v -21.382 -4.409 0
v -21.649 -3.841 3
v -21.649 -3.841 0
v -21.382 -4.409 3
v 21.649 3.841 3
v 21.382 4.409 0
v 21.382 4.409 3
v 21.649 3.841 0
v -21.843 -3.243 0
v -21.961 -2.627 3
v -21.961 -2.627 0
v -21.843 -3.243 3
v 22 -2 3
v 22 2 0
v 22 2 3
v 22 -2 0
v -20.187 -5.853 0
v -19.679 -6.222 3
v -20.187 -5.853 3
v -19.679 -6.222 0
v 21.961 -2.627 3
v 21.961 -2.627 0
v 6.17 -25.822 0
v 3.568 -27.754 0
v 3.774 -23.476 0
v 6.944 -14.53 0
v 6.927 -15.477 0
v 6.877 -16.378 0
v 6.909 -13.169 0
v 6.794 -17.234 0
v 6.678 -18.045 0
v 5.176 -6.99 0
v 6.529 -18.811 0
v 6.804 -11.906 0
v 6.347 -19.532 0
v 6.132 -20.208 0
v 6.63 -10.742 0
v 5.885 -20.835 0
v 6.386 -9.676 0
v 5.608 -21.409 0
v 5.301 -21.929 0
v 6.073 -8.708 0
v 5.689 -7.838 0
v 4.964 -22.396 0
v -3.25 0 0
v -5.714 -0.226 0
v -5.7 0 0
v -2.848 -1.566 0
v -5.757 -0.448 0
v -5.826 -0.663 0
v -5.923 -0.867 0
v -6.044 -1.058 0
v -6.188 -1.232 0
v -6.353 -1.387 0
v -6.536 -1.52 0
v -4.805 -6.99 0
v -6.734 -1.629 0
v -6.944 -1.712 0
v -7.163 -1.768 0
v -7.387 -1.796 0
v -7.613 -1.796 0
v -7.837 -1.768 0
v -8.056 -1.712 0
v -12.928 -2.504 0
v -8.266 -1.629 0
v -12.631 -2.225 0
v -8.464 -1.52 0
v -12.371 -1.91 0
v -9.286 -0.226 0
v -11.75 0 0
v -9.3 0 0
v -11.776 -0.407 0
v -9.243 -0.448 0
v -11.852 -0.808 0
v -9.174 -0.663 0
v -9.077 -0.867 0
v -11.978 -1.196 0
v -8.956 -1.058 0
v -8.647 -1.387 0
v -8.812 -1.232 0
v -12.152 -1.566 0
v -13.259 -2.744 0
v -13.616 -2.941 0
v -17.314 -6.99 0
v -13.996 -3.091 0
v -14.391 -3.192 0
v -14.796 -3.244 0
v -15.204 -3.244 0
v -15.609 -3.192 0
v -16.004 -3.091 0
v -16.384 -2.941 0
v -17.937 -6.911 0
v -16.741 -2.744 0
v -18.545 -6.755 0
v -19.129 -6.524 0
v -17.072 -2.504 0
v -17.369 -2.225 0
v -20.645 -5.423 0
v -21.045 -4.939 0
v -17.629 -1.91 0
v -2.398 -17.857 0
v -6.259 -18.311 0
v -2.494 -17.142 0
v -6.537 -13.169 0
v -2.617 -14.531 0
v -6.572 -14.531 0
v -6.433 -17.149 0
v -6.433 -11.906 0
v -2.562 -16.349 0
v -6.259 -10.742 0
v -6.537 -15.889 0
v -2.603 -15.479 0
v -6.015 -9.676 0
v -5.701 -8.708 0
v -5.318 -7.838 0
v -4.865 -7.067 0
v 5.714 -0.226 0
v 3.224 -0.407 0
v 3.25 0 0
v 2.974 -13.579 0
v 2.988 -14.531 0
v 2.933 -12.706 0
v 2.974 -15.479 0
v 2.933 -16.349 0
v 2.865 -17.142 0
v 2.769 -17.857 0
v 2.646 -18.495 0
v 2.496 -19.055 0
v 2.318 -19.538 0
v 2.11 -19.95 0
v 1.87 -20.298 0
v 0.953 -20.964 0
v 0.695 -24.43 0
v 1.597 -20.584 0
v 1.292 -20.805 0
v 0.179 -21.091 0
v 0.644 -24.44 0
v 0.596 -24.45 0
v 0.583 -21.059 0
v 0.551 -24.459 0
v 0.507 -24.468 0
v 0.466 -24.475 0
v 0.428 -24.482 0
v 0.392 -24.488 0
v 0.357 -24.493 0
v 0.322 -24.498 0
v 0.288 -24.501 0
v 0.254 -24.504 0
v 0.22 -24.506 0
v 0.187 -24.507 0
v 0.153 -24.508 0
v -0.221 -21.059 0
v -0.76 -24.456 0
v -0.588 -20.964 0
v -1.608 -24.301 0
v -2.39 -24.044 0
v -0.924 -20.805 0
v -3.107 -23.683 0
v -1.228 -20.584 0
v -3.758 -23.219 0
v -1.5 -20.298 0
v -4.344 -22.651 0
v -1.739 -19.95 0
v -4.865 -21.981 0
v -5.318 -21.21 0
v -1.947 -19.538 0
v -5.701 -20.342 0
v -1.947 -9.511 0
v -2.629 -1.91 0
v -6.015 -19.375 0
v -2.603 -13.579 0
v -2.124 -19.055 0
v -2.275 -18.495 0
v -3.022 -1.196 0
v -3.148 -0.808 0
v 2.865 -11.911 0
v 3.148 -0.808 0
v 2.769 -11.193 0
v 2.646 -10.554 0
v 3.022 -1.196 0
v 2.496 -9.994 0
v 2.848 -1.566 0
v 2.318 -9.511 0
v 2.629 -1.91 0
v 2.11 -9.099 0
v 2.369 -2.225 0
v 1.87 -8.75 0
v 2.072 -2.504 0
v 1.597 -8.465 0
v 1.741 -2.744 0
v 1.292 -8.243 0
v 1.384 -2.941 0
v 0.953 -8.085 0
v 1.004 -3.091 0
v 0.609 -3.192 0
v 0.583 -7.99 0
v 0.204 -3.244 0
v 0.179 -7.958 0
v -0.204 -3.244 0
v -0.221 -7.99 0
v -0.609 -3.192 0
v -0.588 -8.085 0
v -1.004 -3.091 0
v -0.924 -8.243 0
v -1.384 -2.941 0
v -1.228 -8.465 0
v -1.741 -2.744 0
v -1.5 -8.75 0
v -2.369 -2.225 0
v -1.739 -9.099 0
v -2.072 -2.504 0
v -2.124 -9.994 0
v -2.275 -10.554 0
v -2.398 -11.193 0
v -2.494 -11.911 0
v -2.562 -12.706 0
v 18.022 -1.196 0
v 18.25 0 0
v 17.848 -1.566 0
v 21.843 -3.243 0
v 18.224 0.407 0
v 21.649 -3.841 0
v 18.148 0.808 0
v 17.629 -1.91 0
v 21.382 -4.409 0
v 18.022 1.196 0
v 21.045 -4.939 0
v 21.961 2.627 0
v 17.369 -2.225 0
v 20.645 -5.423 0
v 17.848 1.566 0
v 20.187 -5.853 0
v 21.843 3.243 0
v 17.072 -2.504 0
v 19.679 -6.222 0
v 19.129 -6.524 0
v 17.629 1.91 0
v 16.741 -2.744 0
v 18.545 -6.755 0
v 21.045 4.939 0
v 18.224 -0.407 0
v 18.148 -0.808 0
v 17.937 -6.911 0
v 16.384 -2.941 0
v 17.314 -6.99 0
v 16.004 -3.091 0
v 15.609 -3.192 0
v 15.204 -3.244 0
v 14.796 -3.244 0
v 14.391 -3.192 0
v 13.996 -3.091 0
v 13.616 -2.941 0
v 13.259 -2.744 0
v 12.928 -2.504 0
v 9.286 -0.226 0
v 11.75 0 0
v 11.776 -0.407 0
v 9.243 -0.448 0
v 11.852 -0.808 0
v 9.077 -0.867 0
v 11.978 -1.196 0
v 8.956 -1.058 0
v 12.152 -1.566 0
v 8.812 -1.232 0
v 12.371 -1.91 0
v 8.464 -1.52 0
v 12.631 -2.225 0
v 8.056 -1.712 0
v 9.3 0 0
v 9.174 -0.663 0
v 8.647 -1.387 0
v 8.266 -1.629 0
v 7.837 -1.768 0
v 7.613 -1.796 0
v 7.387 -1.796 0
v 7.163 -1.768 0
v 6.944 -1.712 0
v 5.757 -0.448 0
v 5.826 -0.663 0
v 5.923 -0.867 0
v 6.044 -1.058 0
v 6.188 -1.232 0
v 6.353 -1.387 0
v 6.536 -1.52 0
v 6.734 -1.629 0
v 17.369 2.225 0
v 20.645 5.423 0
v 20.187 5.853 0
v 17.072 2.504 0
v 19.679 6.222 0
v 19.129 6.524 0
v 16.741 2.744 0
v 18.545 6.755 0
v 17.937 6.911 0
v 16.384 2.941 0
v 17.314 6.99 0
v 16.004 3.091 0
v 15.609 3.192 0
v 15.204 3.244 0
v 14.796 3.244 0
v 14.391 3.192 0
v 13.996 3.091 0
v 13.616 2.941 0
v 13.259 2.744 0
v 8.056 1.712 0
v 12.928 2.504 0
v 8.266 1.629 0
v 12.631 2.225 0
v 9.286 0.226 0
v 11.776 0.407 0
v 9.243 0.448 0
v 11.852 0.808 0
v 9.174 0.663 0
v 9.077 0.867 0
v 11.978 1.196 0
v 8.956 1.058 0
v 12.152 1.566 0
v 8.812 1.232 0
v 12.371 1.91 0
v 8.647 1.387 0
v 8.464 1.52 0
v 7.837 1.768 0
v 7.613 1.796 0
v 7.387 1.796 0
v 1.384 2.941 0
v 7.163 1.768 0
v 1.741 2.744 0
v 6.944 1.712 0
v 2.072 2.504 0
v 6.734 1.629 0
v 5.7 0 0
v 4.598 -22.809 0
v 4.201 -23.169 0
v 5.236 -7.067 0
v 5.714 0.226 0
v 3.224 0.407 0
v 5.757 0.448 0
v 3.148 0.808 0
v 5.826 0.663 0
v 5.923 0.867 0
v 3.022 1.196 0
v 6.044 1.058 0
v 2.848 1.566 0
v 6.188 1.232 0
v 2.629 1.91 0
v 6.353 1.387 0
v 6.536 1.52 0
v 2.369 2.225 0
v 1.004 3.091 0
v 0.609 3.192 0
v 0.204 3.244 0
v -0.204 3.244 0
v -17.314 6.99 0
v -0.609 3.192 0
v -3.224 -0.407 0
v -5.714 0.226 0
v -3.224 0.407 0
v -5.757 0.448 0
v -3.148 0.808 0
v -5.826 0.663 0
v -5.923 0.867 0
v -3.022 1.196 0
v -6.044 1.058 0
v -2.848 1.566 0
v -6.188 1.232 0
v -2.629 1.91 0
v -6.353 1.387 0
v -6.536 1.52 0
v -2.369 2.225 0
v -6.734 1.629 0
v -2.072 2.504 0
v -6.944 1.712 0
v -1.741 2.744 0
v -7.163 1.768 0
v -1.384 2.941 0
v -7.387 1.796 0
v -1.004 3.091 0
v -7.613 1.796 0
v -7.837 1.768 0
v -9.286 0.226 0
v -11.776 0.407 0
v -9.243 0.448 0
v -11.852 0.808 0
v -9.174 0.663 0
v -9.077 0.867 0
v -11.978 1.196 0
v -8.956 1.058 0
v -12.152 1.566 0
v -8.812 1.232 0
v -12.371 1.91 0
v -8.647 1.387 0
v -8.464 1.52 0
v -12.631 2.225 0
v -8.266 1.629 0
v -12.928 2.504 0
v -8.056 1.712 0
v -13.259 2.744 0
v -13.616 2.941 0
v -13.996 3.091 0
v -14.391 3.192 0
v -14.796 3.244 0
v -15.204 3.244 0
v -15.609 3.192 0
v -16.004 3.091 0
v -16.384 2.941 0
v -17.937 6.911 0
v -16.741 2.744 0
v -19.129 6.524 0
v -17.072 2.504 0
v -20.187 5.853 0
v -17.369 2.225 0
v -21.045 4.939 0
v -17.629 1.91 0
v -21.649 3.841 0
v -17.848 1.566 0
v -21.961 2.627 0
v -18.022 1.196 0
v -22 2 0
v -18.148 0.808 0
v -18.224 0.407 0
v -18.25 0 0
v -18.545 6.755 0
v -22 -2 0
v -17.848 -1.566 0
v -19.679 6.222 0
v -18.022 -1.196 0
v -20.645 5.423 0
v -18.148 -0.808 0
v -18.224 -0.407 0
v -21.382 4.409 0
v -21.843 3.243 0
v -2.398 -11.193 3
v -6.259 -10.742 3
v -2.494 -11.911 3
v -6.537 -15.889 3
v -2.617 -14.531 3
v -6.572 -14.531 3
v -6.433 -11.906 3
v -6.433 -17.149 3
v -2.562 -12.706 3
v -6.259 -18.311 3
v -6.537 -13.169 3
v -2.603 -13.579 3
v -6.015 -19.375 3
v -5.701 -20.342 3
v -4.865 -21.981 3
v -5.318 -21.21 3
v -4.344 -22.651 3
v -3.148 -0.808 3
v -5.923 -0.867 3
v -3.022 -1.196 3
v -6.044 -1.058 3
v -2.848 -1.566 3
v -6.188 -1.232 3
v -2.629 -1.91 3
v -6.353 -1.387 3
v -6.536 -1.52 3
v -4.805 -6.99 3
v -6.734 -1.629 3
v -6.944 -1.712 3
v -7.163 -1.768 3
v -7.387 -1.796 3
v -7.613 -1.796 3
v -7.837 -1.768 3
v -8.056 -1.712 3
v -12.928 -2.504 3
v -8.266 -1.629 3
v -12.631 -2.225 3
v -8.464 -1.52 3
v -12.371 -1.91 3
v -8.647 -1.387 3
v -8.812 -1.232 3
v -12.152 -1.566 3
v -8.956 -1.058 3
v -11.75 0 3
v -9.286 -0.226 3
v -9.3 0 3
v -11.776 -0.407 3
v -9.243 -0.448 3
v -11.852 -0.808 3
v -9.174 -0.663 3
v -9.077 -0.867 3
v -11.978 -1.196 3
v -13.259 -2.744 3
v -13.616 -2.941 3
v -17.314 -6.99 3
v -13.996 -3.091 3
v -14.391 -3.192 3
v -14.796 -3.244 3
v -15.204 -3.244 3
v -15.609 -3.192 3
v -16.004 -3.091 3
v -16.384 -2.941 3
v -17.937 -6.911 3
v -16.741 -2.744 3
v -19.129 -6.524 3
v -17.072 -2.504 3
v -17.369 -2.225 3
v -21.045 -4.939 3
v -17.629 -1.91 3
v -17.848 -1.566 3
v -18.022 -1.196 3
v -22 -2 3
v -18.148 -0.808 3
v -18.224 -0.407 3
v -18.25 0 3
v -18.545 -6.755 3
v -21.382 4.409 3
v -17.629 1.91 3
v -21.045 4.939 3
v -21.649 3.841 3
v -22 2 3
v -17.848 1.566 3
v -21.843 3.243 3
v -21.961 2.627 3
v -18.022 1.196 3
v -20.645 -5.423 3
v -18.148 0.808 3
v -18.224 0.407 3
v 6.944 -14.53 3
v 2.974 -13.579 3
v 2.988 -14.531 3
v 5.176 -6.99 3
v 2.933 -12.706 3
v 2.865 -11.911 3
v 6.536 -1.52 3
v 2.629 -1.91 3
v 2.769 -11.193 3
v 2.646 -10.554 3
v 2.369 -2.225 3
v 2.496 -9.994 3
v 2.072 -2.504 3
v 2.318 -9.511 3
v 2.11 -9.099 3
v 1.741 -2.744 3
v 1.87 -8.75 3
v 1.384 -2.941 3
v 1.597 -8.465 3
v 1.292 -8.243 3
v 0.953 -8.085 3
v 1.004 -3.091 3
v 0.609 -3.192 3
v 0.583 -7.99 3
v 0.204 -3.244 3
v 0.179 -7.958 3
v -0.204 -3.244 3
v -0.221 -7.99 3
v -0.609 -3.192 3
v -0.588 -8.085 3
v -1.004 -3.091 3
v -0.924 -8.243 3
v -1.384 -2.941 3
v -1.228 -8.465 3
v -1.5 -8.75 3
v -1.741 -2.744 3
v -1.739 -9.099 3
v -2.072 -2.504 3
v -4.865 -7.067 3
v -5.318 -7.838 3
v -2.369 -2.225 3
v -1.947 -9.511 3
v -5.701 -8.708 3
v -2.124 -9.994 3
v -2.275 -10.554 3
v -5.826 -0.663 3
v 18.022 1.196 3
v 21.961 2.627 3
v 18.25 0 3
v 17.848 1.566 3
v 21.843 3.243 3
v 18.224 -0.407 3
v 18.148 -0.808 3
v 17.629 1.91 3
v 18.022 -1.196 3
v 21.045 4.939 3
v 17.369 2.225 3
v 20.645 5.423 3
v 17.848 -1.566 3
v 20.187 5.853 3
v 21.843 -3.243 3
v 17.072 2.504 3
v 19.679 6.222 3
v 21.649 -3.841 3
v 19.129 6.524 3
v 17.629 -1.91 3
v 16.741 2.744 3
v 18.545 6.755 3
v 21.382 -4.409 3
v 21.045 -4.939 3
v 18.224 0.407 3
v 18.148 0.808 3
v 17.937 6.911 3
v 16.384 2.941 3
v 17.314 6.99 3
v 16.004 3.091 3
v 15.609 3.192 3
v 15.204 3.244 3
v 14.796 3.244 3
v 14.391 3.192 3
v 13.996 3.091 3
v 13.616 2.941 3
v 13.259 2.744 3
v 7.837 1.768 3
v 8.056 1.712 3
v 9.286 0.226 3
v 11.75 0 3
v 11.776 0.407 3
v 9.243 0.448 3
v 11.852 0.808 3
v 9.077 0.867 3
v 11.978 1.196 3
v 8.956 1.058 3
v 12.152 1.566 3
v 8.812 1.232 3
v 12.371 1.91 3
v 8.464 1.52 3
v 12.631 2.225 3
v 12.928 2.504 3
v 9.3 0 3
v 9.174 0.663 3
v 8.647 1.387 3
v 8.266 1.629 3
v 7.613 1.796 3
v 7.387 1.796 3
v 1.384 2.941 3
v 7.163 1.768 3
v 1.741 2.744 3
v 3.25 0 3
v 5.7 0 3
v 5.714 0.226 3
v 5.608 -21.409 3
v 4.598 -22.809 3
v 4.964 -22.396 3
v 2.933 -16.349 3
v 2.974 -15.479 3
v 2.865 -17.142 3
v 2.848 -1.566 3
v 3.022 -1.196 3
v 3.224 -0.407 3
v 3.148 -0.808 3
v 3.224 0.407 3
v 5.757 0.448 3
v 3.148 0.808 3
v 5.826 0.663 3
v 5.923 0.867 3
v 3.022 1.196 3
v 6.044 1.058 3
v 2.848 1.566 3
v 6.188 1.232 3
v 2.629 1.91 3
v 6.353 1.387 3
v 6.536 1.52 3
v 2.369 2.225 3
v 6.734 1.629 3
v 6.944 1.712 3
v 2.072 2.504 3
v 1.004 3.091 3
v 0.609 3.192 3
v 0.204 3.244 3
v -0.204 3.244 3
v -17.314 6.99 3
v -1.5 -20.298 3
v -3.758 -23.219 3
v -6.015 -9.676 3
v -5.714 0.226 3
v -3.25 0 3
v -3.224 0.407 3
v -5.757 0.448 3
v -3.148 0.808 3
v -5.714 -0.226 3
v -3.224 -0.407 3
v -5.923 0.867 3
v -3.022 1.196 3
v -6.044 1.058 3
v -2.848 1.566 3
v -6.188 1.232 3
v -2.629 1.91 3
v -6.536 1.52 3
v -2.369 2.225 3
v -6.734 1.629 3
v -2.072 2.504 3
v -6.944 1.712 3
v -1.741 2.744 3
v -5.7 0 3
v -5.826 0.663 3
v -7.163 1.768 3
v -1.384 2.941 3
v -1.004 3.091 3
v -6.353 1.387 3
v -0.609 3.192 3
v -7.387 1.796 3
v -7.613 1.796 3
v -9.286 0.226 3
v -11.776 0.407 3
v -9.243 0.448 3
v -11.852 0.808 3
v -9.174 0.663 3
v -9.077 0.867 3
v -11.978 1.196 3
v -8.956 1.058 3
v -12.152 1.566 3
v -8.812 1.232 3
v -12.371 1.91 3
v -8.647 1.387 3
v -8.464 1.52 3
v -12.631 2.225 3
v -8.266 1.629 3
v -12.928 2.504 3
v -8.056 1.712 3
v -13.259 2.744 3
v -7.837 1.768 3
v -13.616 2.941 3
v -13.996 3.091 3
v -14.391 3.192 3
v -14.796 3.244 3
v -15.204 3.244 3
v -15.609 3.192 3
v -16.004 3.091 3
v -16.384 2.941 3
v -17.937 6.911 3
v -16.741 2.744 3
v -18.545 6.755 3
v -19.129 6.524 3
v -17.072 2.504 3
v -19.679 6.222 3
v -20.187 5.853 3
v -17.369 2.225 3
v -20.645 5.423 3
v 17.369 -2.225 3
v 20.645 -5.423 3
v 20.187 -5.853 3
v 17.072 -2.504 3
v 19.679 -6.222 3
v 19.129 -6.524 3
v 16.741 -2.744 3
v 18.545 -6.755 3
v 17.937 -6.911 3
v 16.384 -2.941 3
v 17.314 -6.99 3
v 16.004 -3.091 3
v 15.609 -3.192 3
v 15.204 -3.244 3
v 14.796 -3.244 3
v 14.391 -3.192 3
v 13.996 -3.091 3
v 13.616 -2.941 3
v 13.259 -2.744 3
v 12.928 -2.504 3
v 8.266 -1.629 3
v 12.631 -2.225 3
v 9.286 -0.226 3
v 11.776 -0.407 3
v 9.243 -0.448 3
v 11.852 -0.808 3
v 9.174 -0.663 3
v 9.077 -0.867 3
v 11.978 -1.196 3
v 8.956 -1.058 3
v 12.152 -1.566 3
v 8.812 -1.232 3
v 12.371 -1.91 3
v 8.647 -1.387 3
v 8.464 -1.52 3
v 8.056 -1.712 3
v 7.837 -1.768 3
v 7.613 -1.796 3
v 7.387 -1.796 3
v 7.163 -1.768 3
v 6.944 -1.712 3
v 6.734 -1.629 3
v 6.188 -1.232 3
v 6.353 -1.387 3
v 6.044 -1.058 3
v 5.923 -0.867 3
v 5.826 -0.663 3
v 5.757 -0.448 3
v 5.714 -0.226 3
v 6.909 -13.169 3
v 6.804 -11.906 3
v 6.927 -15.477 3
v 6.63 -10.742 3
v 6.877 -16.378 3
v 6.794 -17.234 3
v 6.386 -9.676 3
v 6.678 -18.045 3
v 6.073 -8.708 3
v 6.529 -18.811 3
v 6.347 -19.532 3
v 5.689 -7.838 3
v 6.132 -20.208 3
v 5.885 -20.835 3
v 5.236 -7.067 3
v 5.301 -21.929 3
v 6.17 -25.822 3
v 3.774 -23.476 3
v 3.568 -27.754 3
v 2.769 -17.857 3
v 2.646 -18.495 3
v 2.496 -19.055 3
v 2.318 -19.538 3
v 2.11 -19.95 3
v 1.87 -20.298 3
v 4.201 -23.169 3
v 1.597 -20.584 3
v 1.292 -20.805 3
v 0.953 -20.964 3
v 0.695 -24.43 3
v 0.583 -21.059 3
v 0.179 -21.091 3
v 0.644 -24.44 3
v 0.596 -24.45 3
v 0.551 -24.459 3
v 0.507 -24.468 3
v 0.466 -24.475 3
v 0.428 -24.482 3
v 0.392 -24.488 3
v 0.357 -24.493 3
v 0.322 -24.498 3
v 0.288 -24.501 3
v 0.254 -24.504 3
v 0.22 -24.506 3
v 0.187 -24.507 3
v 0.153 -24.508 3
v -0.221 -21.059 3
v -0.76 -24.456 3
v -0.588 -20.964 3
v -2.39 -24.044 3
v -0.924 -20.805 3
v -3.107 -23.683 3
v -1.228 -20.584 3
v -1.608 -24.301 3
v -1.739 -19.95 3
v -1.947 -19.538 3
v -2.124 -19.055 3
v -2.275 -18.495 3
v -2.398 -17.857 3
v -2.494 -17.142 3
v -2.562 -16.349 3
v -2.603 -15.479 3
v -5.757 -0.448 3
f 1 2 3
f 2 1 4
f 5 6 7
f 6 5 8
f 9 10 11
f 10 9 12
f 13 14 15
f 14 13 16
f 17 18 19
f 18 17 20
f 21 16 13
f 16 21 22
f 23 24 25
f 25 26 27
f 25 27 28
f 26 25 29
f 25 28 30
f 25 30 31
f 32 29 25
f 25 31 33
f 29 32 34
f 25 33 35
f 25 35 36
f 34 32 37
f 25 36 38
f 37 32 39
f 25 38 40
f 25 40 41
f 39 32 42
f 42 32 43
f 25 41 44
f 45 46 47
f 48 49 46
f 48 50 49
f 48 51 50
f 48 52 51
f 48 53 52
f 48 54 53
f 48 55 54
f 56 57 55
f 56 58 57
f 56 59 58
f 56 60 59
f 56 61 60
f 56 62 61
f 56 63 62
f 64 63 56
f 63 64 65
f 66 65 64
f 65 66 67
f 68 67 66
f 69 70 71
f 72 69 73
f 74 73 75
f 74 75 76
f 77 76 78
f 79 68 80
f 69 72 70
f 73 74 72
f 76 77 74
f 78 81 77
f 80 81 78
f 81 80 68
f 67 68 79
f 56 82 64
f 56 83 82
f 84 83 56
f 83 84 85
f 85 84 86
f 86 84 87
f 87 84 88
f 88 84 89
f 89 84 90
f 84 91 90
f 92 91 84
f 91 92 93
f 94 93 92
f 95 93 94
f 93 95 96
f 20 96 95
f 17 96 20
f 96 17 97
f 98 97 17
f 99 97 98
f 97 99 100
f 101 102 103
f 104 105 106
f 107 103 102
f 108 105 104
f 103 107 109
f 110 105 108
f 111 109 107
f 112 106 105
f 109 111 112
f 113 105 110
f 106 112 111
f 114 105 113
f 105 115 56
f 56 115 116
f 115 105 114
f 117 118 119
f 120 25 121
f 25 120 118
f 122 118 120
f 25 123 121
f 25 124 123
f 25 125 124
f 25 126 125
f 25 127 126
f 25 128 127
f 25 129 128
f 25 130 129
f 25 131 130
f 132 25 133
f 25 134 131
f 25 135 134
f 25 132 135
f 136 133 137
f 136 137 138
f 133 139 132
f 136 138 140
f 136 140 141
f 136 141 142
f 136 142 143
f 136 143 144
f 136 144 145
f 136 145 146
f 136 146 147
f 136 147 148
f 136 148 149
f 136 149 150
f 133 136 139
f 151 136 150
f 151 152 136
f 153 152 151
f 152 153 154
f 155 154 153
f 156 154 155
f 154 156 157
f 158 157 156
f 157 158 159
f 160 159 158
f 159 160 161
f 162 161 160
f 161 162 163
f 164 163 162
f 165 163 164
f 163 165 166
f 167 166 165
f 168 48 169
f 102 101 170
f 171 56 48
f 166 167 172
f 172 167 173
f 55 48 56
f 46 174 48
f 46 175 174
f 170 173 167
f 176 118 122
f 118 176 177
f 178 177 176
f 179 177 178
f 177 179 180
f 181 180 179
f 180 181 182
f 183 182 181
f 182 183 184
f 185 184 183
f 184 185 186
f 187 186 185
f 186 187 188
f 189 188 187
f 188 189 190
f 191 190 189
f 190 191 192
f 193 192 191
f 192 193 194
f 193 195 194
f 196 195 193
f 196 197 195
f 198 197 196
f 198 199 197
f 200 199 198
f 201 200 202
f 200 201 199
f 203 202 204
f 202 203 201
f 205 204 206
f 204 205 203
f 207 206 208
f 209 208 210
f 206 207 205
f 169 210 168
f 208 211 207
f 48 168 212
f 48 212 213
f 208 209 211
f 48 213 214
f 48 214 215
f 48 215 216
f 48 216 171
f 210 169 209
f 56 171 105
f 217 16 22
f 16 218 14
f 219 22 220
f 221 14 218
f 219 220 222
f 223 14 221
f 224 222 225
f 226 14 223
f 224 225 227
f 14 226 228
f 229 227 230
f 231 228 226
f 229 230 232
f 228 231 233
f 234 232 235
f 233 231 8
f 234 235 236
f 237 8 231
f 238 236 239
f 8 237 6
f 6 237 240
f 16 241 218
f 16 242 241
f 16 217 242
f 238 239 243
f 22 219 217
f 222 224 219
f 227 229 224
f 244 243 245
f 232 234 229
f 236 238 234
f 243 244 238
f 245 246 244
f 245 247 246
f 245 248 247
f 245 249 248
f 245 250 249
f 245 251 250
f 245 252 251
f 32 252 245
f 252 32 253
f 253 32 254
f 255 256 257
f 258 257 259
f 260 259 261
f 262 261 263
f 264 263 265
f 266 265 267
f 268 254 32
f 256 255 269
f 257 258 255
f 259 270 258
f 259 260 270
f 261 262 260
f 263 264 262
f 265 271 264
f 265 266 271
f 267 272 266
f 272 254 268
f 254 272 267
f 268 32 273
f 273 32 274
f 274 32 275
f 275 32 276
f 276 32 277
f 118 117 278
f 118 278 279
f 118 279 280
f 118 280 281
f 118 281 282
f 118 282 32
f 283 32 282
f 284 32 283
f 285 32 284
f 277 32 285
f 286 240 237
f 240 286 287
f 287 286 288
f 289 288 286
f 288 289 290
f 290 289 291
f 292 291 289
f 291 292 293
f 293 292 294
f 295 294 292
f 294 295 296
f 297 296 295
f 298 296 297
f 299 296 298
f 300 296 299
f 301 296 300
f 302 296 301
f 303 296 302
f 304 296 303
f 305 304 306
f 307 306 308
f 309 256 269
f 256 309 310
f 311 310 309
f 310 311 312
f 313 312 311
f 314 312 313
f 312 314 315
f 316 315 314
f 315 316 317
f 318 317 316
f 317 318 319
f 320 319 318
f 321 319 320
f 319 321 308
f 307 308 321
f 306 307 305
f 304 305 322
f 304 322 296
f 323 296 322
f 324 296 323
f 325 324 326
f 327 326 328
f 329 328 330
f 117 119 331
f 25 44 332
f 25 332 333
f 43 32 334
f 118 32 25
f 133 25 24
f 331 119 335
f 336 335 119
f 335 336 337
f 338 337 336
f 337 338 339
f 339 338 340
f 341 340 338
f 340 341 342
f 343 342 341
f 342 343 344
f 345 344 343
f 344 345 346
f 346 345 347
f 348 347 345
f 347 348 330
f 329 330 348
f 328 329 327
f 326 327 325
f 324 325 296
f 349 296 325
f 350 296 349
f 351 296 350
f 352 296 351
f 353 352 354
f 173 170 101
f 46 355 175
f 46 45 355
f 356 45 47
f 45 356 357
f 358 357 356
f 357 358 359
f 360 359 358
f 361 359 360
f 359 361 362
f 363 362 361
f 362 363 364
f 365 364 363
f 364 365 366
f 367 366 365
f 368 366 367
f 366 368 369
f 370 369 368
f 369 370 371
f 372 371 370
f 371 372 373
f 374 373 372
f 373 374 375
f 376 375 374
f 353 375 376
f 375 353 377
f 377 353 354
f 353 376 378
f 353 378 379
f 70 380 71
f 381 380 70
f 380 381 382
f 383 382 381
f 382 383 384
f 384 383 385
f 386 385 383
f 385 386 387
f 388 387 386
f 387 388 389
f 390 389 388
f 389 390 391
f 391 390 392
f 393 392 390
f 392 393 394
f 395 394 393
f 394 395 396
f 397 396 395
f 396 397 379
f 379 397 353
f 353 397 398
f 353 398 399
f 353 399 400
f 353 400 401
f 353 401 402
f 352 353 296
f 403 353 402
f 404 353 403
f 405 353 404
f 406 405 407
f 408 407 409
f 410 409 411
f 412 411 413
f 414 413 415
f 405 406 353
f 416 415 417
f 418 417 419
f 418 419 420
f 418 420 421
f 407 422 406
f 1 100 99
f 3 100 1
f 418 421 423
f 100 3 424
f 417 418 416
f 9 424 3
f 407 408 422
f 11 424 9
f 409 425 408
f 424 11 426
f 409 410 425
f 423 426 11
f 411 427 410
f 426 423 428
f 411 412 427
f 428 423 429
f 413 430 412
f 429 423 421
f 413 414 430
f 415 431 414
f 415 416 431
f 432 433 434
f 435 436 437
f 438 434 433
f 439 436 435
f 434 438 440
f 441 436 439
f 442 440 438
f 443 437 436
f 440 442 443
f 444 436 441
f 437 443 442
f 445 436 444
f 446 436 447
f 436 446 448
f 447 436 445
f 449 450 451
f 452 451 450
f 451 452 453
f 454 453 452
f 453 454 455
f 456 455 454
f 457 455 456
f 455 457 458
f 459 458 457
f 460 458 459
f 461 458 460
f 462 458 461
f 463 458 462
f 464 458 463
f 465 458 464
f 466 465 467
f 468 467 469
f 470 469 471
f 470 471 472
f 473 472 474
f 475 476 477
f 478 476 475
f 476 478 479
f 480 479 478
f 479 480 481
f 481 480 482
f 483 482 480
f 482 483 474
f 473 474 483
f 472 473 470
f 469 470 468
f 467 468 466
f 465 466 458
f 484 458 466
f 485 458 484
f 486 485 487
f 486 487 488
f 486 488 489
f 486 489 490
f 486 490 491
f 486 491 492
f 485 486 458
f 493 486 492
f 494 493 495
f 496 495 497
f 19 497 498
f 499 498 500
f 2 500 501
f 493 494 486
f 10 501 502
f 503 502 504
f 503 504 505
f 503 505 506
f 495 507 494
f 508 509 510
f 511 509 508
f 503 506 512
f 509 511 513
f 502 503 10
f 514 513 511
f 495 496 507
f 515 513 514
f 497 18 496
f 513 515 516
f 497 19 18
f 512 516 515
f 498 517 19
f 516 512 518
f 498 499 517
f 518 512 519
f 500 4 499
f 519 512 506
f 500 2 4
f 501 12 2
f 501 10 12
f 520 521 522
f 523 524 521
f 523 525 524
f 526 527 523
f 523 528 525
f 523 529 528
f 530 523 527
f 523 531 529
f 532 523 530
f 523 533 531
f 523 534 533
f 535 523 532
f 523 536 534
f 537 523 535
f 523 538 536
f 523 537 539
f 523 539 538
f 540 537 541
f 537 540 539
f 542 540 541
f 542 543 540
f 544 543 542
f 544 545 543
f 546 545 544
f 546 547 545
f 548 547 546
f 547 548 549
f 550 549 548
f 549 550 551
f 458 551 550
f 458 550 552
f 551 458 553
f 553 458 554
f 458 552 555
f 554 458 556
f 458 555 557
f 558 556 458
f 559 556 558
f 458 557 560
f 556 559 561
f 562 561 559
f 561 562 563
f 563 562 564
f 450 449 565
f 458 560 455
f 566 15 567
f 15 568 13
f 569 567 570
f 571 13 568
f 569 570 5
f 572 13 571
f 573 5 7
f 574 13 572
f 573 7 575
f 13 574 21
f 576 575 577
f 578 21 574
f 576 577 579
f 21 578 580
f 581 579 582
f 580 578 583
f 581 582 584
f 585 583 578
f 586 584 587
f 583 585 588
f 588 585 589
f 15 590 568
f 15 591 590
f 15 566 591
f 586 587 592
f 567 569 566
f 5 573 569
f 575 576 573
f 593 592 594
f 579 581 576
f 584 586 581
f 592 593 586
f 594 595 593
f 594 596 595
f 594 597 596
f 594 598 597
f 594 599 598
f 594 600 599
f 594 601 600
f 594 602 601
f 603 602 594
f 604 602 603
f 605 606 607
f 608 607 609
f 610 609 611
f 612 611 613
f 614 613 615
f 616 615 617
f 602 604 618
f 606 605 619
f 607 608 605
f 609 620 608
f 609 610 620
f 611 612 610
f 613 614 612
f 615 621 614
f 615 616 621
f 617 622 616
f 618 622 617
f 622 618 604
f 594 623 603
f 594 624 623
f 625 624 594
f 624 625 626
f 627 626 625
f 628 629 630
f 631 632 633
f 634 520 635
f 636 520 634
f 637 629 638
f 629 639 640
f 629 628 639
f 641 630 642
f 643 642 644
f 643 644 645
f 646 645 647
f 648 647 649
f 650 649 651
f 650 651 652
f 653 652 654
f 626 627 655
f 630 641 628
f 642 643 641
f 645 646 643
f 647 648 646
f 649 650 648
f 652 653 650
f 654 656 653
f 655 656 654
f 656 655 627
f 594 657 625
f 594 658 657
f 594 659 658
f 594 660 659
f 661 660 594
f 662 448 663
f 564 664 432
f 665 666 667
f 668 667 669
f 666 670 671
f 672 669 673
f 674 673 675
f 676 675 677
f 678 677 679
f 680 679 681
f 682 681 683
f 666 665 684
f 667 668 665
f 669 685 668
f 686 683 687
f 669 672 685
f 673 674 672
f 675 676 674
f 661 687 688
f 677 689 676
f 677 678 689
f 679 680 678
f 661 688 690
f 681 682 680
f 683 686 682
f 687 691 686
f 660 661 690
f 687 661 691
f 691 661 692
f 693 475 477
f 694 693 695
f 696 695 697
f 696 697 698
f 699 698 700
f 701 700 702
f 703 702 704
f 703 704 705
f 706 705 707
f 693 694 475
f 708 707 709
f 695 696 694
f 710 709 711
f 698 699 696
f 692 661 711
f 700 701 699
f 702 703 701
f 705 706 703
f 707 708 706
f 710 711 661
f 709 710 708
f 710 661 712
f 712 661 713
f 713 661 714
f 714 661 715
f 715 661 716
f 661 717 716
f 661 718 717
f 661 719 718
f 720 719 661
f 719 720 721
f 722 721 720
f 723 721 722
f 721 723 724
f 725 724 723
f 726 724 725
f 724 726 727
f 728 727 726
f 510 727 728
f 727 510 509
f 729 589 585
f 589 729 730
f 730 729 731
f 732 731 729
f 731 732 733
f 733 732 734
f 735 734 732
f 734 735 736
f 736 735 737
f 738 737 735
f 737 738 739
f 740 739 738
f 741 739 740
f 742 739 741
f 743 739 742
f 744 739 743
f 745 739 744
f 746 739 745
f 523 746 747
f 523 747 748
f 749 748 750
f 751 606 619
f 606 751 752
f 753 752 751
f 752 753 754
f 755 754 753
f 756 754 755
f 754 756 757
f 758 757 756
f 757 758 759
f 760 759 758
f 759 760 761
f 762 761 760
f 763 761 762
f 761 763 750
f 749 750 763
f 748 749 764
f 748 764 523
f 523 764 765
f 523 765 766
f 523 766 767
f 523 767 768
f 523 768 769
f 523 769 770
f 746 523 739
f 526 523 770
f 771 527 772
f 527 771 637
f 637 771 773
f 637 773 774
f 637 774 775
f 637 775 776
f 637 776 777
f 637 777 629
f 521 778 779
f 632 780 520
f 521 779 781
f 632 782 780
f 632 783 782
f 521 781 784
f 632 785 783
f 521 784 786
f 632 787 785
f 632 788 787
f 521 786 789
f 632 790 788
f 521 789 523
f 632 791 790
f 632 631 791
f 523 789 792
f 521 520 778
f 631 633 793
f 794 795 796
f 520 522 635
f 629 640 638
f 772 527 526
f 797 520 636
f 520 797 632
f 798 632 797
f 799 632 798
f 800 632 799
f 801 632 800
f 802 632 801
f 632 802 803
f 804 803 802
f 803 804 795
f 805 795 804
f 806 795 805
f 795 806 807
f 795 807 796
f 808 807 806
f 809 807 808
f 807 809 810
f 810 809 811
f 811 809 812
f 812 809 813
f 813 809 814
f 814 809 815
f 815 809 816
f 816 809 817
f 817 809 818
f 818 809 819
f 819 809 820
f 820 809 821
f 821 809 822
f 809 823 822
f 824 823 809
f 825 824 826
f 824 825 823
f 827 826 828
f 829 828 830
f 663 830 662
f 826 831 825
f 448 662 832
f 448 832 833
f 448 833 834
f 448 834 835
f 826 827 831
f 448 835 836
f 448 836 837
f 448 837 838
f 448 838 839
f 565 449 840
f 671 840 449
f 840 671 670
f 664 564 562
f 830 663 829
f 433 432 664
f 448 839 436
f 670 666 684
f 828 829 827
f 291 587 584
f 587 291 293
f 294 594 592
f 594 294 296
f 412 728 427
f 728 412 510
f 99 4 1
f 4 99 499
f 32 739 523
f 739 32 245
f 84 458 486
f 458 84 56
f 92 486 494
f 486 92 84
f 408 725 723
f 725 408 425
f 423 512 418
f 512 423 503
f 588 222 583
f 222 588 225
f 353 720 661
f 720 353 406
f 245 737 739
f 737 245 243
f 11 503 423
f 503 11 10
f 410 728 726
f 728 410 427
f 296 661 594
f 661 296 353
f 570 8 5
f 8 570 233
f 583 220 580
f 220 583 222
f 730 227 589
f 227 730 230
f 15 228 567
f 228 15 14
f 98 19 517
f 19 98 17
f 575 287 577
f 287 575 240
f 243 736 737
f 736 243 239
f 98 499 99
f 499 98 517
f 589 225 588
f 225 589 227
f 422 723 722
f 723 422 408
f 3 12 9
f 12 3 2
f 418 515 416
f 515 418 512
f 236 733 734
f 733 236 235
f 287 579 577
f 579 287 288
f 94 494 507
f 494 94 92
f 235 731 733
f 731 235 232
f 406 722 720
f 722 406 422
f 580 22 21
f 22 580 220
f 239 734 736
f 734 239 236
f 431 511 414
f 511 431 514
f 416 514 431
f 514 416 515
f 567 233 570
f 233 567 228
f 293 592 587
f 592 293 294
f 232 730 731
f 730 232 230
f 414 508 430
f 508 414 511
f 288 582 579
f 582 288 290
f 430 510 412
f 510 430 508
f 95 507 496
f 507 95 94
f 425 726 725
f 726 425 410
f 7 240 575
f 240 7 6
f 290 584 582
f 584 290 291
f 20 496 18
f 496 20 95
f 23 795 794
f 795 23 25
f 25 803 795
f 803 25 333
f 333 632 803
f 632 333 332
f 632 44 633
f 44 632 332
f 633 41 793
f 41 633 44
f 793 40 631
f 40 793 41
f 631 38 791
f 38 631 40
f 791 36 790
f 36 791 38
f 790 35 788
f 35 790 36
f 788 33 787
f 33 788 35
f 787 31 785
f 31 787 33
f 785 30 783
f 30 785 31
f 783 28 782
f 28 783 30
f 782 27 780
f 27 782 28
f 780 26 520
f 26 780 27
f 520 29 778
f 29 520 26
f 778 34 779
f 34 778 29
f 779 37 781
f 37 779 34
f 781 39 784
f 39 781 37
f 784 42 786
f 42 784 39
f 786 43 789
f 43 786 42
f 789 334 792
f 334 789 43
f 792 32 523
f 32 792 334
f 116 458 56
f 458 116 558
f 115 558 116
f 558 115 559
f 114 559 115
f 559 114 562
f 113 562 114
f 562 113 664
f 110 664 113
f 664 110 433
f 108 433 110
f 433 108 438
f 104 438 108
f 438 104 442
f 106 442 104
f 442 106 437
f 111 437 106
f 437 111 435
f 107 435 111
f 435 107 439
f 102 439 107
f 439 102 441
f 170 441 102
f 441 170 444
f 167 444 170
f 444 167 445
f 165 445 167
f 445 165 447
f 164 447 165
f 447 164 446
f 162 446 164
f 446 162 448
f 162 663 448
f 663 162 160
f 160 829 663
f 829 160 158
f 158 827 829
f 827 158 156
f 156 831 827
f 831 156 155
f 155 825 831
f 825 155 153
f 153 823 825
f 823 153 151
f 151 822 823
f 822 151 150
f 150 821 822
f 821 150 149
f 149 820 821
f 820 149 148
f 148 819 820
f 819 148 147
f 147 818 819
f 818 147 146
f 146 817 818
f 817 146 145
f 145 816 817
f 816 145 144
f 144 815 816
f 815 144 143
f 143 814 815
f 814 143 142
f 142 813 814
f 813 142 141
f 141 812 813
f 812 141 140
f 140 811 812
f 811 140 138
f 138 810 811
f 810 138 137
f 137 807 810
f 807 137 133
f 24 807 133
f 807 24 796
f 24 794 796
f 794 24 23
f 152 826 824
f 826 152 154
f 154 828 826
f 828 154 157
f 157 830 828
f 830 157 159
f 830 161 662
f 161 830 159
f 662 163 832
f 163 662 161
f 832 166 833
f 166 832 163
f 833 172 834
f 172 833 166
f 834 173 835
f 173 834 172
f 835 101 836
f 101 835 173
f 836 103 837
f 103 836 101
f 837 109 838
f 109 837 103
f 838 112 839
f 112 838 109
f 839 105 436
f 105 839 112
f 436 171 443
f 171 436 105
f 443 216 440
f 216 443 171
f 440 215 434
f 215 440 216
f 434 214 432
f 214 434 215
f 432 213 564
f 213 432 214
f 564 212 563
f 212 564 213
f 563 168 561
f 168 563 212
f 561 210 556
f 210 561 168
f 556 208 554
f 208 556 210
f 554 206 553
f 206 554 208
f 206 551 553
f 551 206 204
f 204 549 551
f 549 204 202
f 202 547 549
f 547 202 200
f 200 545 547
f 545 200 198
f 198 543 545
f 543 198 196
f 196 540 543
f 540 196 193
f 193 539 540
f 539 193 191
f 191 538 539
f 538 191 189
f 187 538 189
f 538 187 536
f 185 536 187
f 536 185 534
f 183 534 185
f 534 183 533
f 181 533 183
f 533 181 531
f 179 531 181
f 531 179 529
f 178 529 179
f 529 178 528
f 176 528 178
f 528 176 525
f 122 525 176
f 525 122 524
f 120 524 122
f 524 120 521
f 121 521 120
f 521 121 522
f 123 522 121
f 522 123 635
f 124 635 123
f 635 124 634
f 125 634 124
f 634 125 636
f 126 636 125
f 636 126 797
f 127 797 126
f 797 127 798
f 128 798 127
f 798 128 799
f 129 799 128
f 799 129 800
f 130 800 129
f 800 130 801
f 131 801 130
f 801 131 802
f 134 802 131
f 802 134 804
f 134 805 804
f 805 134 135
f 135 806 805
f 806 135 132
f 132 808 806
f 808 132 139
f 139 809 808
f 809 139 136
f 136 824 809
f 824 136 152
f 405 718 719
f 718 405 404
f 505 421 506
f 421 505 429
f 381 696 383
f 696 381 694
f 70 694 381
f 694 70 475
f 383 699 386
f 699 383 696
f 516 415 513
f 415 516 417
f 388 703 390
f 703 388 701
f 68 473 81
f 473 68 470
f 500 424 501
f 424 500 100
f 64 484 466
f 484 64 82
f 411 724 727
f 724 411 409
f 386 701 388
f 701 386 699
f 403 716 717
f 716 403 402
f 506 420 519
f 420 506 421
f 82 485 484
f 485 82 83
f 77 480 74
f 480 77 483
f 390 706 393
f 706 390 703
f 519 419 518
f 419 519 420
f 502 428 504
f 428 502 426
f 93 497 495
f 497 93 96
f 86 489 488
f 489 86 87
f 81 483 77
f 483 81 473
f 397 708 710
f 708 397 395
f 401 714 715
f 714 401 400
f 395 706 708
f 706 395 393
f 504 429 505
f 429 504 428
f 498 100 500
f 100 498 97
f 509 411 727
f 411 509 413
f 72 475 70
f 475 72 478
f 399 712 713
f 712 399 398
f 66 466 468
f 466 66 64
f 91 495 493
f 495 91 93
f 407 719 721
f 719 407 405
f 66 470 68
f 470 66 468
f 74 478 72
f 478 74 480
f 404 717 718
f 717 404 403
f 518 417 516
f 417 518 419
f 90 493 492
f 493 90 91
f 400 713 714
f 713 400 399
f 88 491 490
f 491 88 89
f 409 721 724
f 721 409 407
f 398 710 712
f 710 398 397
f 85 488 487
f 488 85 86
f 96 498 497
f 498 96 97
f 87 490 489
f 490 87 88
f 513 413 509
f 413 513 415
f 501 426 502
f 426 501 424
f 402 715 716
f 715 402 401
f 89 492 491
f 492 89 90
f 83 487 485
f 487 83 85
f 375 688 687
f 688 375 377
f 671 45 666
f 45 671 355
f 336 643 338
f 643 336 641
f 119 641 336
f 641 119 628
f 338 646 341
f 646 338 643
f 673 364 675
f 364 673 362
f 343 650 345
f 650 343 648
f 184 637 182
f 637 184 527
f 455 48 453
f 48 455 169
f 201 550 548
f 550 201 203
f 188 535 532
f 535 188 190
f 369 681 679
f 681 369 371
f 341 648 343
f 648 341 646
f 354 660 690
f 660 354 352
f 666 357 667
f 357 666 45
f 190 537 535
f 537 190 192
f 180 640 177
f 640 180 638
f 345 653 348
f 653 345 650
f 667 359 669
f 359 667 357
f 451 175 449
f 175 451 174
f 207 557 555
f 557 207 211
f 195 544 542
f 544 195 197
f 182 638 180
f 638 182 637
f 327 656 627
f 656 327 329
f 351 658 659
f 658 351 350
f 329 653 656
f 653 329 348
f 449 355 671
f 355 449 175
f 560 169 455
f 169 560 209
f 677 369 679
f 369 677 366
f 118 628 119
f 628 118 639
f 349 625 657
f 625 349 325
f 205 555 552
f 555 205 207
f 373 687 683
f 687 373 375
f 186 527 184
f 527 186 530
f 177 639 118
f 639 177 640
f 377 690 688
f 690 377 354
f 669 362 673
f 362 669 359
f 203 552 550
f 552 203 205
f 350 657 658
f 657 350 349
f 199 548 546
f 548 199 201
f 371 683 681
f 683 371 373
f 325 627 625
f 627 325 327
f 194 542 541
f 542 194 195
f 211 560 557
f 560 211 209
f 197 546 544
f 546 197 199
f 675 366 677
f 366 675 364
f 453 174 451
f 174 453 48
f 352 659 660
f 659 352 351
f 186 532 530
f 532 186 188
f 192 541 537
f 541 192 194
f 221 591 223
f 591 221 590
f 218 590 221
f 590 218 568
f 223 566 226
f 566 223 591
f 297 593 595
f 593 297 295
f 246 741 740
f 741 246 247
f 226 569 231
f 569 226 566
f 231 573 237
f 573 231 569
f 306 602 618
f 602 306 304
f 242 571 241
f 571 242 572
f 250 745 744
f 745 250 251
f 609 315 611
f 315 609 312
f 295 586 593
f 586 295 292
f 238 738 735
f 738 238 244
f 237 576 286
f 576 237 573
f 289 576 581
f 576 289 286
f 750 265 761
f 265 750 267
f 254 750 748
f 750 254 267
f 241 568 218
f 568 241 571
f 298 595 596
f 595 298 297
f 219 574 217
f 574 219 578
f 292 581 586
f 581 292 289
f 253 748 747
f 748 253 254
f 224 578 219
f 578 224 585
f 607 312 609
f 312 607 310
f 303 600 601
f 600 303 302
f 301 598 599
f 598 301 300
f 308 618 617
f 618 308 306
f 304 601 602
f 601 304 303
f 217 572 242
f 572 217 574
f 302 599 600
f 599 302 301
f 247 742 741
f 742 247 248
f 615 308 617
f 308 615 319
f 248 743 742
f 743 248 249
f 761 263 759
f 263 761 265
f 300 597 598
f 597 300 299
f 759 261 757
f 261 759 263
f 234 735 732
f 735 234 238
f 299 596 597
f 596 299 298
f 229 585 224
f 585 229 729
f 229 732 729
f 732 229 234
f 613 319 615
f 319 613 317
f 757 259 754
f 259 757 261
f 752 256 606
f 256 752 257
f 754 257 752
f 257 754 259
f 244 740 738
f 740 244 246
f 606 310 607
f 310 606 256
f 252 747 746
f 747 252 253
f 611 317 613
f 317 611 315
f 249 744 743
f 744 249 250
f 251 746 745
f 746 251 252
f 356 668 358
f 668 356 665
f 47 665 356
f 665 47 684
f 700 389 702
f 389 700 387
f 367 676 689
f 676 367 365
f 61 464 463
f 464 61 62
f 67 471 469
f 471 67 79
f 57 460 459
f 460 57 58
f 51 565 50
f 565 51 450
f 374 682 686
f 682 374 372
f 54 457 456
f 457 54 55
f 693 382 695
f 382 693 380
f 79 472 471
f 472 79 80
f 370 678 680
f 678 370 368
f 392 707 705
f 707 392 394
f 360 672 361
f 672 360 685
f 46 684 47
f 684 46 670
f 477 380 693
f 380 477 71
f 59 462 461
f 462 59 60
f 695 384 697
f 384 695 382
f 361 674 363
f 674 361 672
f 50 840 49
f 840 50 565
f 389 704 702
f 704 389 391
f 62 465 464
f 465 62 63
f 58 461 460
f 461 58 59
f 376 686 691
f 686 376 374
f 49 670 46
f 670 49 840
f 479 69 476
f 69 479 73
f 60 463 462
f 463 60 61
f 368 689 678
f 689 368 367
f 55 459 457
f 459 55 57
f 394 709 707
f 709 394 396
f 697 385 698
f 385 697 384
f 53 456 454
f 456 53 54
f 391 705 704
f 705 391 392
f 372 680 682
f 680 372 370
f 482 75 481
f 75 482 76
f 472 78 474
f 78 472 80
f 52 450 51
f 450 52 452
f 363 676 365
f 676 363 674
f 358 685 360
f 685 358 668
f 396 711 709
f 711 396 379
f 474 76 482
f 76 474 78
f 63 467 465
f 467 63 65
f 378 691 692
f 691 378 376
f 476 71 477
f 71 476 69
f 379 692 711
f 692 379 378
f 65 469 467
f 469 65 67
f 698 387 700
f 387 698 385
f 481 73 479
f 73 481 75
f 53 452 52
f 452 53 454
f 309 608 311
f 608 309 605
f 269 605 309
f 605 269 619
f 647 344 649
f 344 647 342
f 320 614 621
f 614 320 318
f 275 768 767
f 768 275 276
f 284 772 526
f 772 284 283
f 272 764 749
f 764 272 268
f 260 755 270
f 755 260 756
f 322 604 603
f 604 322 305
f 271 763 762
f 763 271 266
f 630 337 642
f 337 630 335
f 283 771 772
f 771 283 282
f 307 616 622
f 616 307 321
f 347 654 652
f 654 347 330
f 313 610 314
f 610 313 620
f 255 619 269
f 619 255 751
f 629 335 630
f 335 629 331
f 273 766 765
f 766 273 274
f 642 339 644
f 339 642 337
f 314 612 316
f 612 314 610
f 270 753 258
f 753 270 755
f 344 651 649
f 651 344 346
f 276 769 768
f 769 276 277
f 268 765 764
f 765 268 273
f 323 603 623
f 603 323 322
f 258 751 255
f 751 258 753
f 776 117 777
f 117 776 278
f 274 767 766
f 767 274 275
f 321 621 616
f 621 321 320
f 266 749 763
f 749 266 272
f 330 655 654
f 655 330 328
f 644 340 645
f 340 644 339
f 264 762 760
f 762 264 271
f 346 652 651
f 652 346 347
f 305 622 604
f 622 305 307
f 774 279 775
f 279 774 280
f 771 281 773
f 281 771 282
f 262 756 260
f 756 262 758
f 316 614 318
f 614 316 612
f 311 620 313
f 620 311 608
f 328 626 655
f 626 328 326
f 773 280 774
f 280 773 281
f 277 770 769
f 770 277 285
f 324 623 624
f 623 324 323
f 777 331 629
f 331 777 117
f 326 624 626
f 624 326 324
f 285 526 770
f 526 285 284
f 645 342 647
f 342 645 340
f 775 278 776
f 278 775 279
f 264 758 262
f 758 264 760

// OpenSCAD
$fn = 50;


difference() {
	union() {
		hull() {
			translate(v = [-17.0000000000, 2.0000000000, 0]) {
				cylinder(h = 3, r = 5);
			}
			translate(v = [17.0000000000, 2.0000000000, 0]) {
				cylinder(h = 3, r = 5);
			}
			translate(v = [-17.0000000000, -2.0000000000, 0]) {
				cylinder(h = 3, r = 5);
			}
			translate(v = [17.0000000000, -2.0000000000, 0]) {
				cylinder(h = 3, r = 5);
			}
		}
		translate(v = [0, -5, 0]) {
			linear_extrude(height = 3) {
				text(font = "DejaVu Sans Mono:style=Bold", halign = "center", size = 19.0000000000, text = "Q", valign = "top");
			}
		}
	}
	union() {
		translate(v = [-15.0000000000, 0.0000000000, 0]) {
			translate(v = [0, 0, -100]) {
				cylinder(h = 200, r = 3.2500000000);
			}
		}
		translate(v = [0, 0, -100]) {
			cylinder(h = 200, r = 3.2500000000);
		}
		translate(v = [15.0000000000, 0.0000000000, 0]) {
			translate(v = [0, 0, -100]) {
				cylinder(h = 200, r = 3.2500000000);
			}
		}
		translate(v = [-15.0000000000, 0.0000000000, 0]) {
			translate(v = [0, 0, -100]) {
				cylinder(h = 200, r = 1.8000000000);
			}
		}
		translate(v = [-7.5000000000, 0.0000000000, 0]) {
			translate(v = [0, 0, -100]) {
				cylinder(h = 200, r = 1.8000000000);
			}
		}
		translate(v = [0, 0, -100]) {
			cylinder(h = 200, r = 1.8000000000);
		}
		translate(v = [7.5000000000, 0.0000000000, 0]) {
			translate(v = [0, 0, -100]) {
				cylinder(h = 200, r = 1.8000000000);
			}
		}
		translate(v = [15.0000000000, 0.0000000000, 0]) {
			translate(v = [0, 0, -100]) {
				cylinder(h = 200, r = 1.8000000000);
			}
		}
	}
}
